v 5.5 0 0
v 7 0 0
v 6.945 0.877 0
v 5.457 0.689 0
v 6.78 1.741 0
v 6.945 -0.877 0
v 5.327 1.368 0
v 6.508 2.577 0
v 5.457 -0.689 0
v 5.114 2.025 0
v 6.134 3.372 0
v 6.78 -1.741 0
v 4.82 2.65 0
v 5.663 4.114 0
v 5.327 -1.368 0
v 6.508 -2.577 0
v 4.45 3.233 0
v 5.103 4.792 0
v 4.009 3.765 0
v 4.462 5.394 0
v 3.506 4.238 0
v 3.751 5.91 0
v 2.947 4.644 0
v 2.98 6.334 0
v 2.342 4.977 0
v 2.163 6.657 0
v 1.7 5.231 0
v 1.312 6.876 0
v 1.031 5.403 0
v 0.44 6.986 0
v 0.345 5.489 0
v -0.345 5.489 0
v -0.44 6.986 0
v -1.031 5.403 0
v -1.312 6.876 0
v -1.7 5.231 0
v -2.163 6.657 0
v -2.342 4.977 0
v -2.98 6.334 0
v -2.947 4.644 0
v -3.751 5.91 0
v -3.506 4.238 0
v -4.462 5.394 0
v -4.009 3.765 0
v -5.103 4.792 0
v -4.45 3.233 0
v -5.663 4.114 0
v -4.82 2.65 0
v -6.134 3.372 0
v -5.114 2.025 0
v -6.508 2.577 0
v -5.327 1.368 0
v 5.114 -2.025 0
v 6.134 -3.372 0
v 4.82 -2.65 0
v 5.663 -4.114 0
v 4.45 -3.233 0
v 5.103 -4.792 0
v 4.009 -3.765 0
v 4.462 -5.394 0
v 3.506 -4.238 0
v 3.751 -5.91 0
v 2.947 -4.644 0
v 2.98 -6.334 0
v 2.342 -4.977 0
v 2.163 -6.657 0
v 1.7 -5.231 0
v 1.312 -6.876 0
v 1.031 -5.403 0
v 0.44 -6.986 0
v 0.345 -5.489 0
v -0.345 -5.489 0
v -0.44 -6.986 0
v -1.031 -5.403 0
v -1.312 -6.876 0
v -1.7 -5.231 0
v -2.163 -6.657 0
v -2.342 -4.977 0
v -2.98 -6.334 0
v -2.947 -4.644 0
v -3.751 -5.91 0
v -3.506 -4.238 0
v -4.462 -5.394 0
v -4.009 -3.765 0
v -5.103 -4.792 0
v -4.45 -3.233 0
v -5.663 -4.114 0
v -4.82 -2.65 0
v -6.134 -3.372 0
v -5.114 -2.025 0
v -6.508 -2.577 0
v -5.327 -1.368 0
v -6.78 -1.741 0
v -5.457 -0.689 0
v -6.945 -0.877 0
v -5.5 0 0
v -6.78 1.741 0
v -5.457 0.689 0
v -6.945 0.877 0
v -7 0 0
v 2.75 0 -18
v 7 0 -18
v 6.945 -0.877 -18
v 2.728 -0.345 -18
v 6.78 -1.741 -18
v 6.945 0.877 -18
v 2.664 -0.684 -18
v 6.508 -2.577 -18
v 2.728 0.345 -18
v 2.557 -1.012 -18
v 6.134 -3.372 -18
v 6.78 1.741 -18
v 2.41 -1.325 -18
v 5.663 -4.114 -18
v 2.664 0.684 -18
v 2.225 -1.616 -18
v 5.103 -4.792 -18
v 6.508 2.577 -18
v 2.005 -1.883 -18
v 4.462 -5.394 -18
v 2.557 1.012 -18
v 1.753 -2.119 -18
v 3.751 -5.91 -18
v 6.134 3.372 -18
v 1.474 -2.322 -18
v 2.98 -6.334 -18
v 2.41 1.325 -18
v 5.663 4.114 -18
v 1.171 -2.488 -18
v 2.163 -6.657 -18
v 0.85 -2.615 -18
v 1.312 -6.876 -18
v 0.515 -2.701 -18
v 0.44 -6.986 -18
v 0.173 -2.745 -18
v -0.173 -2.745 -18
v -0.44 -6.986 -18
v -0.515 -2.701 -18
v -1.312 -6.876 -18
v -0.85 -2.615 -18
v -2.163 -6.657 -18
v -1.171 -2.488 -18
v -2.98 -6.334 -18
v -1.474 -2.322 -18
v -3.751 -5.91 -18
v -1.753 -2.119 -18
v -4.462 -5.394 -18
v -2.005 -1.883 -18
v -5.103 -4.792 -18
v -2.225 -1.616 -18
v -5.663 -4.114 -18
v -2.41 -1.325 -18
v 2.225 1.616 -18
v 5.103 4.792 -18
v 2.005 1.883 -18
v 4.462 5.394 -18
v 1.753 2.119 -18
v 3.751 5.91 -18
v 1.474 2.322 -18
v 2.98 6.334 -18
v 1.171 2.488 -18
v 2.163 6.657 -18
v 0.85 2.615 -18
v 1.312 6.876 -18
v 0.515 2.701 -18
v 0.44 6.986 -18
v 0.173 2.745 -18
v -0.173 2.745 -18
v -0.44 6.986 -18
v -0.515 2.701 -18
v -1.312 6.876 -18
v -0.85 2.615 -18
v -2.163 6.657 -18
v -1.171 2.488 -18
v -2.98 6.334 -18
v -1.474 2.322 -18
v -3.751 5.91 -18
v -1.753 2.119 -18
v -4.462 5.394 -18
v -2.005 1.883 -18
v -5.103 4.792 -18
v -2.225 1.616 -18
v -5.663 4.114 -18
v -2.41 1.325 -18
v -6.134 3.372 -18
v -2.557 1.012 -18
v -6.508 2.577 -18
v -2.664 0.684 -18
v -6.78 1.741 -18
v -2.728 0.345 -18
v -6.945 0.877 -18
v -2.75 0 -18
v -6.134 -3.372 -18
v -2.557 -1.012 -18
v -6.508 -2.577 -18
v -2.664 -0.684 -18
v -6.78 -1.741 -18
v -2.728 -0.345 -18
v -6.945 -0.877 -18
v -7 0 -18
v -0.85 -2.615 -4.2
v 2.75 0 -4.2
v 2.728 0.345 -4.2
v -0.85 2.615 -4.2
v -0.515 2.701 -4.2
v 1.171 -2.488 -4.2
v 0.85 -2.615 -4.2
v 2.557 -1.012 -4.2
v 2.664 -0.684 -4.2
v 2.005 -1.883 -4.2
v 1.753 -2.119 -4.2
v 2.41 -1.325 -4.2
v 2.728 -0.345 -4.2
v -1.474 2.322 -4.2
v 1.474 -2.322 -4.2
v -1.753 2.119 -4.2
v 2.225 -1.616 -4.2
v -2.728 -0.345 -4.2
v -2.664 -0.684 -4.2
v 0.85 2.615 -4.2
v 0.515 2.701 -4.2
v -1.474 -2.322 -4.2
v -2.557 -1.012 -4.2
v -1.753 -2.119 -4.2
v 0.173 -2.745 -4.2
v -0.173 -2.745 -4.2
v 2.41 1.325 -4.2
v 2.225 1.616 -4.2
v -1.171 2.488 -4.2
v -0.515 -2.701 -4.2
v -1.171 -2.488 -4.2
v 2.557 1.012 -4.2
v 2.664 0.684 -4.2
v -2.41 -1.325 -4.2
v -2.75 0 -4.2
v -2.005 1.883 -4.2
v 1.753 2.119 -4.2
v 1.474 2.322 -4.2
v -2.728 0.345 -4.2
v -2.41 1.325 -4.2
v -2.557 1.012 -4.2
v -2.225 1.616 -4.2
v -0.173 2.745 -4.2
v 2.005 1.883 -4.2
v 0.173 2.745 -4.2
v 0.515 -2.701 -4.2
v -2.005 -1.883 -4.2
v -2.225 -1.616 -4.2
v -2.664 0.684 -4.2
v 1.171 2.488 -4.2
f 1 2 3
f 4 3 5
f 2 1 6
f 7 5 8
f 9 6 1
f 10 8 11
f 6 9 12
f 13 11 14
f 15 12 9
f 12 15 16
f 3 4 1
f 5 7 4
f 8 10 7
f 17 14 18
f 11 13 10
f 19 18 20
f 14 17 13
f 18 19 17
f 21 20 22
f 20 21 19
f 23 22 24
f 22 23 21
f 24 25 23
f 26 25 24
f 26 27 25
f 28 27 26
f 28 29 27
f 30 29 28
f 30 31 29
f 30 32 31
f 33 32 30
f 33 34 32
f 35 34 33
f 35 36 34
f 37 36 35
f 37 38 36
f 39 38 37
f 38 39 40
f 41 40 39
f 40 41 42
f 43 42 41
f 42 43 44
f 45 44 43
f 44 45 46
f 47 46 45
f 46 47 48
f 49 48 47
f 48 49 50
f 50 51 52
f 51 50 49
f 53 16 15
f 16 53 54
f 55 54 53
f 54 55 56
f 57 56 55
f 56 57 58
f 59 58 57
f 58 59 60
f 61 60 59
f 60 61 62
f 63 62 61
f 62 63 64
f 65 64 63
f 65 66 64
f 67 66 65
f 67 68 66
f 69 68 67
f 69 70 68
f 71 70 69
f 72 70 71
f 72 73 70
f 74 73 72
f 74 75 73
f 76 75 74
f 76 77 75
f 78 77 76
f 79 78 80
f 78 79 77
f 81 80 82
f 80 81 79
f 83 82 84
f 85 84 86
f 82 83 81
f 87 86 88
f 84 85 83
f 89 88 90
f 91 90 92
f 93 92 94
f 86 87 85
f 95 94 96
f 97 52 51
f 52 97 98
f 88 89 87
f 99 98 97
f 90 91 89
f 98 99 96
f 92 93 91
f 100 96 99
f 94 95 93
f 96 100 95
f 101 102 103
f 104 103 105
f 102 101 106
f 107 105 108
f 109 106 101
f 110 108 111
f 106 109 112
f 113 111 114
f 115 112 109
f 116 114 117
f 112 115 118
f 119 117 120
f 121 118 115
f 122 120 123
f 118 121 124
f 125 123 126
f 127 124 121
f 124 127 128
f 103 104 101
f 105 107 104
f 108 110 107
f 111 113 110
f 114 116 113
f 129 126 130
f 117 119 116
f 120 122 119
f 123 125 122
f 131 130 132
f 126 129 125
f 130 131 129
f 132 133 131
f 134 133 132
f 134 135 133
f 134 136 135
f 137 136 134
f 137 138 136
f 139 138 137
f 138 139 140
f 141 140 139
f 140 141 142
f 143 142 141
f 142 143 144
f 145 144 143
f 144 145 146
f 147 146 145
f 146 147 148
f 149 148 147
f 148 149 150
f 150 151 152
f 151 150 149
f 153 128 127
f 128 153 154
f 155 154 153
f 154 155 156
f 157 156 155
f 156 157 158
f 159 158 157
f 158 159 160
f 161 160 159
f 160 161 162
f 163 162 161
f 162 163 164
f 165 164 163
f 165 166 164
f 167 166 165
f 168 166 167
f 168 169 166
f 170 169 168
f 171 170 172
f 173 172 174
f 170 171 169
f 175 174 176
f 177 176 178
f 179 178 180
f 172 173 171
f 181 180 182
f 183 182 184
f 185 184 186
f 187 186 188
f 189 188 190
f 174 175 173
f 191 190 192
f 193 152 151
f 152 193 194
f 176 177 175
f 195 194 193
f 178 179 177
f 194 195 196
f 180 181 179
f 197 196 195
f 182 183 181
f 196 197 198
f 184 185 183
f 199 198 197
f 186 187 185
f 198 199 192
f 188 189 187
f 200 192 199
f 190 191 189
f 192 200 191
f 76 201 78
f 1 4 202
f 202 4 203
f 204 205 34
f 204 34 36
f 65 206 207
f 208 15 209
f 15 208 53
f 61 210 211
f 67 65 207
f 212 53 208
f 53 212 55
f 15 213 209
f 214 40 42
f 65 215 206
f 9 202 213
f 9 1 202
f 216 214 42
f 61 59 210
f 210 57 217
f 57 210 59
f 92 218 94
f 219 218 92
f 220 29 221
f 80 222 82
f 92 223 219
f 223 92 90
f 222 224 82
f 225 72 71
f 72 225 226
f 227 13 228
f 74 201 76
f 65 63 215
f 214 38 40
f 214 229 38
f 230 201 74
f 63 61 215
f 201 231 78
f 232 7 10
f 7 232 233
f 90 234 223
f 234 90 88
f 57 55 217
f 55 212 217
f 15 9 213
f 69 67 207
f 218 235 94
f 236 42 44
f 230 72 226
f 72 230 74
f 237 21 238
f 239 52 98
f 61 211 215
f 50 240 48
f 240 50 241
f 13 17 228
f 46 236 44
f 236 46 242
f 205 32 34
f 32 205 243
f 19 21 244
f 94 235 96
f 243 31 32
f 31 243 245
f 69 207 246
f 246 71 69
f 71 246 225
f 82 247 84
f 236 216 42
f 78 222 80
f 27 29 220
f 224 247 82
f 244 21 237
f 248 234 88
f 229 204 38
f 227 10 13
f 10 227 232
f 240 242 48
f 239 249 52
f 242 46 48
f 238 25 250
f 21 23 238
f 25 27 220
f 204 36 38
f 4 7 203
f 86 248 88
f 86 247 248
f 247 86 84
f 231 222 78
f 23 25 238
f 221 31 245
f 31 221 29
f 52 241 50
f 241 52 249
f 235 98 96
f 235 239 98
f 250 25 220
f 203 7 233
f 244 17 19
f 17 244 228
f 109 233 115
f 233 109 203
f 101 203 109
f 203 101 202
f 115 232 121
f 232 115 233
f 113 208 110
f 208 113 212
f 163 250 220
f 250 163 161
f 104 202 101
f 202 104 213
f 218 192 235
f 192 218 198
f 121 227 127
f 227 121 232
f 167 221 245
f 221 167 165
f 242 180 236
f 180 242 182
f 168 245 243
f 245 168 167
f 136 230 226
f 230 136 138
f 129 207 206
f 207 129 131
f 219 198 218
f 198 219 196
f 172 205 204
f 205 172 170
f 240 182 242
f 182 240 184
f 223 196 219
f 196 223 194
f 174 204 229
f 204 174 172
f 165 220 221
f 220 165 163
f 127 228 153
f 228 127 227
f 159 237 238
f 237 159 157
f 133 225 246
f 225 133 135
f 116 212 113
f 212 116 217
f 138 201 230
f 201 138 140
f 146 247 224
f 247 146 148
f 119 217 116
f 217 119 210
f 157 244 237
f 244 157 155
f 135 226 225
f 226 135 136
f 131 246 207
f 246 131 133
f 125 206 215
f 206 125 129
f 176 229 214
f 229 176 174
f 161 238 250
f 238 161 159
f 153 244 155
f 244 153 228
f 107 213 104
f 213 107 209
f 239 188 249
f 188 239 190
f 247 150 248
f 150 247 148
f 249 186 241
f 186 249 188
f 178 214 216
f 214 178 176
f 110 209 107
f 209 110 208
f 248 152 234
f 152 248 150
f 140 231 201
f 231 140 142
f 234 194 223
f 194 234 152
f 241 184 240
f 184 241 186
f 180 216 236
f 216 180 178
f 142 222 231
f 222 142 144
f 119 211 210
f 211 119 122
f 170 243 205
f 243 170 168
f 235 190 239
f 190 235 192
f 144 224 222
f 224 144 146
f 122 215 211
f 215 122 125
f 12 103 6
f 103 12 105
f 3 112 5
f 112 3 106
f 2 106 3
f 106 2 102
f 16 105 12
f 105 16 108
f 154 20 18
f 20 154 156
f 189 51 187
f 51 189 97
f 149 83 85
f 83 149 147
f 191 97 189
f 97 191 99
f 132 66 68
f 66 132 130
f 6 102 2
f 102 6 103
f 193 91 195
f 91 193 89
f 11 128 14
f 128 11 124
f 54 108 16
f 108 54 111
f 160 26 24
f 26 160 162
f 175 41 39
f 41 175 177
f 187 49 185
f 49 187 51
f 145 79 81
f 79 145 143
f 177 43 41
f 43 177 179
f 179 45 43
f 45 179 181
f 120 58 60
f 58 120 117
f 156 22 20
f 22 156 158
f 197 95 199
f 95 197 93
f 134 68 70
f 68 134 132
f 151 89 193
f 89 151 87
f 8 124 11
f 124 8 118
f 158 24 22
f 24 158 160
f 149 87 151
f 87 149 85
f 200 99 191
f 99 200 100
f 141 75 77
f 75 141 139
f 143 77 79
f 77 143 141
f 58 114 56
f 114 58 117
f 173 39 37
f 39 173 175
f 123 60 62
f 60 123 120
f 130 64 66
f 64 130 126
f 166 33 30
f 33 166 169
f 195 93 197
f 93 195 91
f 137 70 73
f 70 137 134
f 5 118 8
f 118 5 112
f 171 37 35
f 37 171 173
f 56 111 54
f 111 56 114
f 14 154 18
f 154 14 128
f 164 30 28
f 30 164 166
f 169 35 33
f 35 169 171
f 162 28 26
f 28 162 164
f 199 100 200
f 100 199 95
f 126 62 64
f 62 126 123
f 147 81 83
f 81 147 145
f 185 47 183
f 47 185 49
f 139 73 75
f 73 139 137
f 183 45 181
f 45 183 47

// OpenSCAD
$fn = 50;


difference() {
	union() {
		translate(v = [0, 0, -18.0000000000]) {
			cylinder(h = 18, r = 7.0000000000);
		}
		cylinder(h = 0, r = 16.0000000000);
	}
	union() {
		translate(v = [0, 0, 0]) {
			rotate(a = [0, 0, 0]) {
				difference() {
					union() {
						#translate(v = [0, 0, -18.0000000000]) {
							cylinder(h = 18, r = 2.2500000000);
						}
						#translate(v = [0, 0, -4.2000000000]) {
							cylinder(h = 4.2000000000, r1 = 2.7500000000, r2 = 5.5000000000);
						}
						#translate(v = [0, 0, -18.0000000000]) {
							cylinder(h = 18, r = 2.7500000000);
						}
						#translate(v = [0, 0, -18.0000000000]) {
							cylinder(h = 18, r = 2.2500000000);
						}
					}
					union();
				}
			}
		}
	}
}
